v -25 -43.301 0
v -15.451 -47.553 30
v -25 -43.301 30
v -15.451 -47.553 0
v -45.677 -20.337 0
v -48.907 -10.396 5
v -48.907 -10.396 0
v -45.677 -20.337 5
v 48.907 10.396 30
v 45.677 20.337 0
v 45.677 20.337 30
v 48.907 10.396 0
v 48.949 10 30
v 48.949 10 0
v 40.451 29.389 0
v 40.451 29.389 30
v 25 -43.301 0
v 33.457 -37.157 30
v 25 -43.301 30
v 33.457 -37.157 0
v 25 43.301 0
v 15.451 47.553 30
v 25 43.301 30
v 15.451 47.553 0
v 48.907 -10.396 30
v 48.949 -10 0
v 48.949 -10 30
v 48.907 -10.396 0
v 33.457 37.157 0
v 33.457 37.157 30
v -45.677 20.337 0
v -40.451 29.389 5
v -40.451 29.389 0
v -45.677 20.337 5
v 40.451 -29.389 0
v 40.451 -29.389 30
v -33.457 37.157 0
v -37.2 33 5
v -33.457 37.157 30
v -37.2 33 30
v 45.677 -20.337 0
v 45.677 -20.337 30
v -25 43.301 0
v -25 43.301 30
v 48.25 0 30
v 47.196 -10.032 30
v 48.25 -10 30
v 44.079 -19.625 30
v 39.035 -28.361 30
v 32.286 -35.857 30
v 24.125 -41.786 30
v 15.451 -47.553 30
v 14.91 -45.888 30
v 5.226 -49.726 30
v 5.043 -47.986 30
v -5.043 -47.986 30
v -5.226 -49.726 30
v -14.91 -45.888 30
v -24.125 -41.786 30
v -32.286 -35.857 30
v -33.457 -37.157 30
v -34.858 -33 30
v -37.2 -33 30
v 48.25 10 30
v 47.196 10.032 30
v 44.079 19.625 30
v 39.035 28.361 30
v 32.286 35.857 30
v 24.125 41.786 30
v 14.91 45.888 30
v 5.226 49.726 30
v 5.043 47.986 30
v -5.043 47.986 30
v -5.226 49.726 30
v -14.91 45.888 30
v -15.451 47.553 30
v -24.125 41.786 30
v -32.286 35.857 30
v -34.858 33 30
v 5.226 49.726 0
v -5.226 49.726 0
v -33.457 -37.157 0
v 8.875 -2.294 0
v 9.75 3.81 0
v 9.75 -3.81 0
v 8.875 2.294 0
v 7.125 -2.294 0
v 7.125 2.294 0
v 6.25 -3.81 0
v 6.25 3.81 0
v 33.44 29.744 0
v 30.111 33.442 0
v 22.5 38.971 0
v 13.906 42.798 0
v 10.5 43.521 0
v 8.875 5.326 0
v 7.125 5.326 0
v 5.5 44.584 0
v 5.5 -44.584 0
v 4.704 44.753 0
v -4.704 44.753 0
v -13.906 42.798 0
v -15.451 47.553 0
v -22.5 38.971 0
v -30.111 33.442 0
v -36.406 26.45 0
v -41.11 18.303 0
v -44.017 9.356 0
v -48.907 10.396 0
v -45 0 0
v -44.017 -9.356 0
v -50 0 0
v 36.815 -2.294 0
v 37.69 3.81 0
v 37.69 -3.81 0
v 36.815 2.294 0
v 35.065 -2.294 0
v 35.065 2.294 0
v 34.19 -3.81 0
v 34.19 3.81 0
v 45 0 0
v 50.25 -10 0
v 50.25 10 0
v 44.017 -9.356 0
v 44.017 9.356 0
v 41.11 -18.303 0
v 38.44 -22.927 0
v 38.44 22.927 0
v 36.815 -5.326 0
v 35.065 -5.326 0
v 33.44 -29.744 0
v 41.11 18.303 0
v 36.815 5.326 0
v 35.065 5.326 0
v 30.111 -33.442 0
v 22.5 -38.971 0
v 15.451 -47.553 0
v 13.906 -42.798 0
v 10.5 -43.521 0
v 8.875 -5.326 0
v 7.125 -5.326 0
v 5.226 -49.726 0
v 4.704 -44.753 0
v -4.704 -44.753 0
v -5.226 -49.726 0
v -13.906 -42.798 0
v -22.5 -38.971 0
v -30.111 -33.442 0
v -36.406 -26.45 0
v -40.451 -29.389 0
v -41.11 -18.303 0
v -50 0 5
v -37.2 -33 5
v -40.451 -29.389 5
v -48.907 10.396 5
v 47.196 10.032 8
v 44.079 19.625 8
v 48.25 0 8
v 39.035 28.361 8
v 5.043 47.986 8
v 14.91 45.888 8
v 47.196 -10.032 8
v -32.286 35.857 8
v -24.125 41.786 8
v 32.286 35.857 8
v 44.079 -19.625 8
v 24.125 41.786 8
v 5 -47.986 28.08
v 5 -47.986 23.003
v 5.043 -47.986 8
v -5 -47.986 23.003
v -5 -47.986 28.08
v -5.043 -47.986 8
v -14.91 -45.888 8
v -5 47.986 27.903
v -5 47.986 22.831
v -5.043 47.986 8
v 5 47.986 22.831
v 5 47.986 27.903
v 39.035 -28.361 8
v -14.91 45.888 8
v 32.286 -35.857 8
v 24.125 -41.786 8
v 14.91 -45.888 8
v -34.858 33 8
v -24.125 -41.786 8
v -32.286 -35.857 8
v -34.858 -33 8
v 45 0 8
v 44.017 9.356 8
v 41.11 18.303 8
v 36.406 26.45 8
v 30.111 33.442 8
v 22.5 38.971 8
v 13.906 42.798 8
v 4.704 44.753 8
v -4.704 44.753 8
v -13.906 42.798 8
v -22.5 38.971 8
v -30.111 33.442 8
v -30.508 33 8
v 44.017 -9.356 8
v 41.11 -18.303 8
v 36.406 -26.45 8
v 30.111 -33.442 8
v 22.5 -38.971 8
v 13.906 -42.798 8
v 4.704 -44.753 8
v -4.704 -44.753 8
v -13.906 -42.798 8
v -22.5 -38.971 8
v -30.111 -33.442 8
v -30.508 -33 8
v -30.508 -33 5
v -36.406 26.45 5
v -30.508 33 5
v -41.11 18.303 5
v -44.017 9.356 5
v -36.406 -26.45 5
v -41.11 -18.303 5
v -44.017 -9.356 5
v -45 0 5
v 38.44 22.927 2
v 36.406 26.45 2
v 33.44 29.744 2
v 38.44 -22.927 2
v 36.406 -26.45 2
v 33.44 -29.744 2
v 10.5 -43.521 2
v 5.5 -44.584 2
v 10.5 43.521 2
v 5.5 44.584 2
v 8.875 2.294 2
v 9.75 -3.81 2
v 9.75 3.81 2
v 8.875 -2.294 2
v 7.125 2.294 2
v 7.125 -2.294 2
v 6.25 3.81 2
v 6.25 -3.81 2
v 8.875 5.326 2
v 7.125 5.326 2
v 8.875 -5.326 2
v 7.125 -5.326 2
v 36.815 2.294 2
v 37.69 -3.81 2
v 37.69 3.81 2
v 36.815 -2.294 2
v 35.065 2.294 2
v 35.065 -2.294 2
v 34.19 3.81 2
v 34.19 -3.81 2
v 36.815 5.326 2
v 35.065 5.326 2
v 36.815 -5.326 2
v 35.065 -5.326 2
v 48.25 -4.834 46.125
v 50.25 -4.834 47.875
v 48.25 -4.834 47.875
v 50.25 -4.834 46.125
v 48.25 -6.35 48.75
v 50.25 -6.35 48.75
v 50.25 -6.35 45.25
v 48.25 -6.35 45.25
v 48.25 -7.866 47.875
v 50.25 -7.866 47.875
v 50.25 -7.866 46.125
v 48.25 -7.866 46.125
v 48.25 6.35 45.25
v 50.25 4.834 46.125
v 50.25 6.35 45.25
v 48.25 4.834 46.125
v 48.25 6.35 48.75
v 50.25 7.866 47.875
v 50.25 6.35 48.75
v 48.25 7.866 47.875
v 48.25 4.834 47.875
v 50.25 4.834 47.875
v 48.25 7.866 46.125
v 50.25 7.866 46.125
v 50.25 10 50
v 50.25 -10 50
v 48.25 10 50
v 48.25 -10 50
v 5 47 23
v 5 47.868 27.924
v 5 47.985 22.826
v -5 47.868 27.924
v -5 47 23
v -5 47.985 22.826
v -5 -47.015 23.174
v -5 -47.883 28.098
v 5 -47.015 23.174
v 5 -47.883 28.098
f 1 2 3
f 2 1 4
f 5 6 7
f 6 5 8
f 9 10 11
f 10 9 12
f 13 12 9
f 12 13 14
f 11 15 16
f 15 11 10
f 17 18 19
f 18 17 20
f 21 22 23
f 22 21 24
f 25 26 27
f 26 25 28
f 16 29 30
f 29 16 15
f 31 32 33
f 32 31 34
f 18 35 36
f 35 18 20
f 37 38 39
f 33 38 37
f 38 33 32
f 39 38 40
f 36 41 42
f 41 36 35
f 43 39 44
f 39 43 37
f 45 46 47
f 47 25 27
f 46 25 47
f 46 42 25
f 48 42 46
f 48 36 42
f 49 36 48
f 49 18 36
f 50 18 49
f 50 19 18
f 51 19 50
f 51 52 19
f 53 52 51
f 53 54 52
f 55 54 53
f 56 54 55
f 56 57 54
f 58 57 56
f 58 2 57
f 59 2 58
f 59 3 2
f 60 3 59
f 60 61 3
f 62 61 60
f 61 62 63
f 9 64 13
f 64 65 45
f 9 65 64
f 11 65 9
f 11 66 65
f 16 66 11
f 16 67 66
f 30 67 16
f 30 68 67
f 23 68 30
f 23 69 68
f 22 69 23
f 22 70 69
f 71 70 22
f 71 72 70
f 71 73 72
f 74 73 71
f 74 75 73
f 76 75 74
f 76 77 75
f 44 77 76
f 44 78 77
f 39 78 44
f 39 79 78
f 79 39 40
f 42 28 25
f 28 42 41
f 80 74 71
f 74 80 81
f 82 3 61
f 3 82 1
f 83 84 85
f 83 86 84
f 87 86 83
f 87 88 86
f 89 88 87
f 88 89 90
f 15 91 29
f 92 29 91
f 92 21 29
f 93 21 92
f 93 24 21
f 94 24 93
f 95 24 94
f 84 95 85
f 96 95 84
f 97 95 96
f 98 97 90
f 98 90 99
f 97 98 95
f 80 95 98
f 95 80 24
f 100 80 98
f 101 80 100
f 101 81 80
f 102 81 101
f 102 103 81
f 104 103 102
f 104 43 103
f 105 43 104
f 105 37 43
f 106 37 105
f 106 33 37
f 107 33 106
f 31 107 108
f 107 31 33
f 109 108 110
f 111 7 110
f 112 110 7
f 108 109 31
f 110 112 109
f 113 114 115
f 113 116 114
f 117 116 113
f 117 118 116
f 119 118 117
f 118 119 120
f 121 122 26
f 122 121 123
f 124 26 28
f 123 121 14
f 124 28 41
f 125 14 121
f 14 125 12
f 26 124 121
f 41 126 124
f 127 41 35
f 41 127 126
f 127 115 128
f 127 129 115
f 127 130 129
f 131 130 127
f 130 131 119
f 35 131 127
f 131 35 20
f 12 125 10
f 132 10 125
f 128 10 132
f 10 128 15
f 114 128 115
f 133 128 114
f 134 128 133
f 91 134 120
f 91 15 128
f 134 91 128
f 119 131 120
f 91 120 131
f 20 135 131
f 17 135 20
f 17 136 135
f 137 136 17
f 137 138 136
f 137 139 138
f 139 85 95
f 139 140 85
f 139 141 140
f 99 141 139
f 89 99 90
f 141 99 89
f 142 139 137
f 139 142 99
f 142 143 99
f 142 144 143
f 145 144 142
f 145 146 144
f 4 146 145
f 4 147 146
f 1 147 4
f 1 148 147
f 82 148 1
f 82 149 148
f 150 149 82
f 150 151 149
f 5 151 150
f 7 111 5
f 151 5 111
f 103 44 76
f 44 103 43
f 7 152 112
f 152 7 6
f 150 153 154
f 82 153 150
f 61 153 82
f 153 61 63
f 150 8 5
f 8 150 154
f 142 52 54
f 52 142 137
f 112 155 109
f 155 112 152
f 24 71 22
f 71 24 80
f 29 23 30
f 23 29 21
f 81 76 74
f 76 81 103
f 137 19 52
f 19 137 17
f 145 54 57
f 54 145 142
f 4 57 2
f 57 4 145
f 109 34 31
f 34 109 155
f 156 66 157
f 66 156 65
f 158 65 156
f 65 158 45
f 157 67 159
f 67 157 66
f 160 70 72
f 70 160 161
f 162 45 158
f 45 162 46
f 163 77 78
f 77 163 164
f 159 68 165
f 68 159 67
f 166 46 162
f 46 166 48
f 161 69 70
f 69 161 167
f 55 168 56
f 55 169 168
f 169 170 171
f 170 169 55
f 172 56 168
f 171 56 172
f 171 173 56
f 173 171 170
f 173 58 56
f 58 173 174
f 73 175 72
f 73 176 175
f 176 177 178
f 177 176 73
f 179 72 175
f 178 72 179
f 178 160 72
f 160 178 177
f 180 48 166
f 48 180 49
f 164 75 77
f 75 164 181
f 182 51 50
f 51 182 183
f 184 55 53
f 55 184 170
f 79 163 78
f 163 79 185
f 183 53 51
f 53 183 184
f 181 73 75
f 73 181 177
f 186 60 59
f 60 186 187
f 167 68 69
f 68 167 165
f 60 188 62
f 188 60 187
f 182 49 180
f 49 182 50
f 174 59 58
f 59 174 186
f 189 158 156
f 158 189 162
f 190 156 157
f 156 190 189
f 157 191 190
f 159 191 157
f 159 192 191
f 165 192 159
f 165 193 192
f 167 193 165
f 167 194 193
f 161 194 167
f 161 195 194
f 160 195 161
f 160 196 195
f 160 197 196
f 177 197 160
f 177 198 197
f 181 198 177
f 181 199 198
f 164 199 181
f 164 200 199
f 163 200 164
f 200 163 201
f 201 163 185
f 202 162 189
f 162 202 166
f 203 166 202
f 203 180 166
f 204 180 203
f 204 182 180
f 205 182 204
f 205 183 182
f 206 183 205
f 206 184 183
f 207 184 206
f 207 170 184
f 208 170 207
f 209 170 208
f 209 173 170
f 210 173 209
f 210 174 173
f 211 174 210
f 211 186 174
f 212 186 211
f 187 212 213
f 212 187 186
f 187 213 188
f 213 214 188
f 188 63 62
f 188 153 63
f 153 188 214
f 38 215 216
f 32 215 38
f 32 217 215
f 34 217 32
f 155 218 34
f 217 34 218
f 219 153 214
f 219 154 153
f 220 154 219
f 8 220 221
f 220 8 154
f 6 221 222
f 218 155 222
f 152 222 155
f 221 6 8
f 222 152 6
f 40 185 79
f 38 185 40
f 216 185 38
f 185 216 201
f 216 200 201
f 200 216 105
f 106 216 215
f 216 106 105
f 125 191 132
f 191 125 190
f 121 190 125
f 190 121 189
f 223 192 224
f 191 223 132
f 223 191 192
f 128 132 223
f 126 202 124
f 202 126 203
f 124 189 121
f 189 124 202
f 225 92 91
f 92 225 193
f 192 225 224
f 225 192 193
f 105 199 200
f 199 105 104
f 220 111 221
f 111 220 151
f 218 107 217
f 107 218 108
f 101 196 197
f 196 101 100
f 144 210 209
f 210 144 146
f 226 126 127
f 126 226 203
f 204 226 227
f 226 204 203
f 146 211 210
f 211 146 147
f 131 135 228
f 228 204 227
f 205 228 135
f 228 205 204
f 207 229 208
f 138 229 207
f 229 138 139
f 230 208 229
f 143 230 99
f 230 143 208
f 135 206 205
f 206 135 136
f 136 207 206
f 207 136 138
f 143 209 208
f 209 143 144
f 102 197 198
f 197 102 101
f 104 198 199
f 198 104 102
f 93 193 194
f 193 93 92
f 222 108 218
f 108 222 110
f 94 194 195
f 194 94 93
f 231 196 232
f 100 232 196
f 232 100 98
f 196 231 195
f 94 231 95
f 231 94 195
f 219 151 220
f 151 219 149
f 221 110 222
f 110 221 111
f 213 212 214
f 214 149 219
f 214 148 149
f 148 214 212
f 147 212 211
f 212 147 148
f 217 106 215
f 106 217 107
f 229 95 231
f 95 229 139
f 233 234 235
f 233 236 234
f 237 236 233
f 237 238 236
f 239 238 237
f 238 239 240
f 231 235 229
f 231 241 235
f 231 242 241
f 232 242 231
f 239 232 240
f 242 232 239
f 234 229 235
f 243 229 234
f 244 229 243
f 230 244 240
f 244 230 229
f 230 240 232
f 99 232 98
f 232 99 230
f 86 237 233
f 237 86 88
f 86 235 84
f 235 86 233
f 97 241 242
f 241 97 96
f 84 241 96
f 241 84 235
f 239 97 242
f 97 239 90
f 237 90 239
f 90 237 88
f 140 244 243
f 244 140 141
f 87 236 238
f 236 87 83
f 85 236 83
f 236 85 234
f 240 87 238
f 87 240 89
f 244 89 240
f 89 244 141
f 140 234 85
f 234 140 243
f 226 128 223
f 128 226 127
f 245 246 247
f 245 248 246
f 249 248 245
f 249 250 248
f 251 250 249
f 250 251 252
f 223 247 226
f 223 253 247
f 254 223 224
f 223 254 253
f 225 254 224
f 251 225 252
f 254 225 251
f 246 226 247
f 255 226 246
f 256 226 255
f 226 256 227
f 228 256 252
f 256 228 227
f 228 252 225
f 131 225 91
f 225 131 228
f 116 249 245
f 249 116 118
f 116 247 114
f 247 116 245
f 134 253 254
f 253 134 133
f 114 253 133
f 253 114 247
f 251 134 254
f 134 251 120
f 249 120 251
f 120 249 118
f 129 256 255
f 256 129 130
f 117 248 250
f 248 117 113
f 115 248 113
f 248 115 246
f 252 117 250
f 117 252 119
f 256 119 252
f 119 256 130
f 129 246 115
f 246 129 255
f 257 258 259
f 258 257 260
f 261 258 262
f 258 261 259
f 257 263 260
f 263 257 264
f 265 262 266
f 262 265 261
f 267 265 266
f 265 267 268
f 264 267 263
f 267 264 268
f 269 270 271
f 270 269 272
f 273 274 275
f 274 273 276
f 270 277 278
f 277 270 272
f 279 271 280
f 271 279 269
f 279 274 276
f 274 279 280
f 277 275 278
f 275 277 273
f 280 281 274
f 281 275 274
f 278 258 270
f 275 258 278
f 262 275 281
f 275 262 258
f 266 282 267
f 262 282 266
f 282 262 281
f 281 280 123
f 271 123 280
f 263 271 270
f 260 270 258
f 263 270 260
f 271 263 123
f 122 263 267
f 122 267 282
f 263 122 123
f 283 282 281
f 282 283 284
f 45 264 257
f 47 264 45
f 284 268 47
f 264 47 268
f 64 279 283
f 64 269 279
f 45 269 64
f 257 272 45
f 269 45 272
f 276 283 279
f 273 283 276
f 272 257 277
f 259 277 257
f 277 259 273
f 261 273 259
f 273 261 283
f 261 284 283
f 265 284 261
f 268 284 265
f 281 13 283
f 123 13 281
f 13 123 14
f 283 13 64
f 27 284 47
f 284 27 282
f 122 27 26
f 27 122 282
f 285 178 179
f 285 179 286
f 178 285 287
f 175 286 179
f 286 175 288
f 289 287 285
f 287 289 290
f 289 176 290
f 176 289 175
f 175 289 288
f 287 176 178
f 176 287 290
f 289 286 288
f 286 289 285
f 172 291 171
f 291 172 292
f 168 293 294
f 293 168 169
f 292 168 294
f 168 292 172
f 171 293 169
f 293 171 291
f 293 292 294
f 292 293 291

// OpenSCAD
// if 0 - all parts, if 1 base if 2 ardunio mount
parts = 1;

if (parts != 2){
union(){
  difference(){
    // Main Body
    cylinder(r=50,h=30);
    // Big Hole
    translate([0,0,8]){
      cylinder(r=48.25, h=30);
    }
    translate([0,0,5]){
      intersection(){
        //Cutout the 'notch'
        rotate([0,0,90]){
          translate([-33,0,0]){
            cube([66,100,30]);
          }
        }
      }
    }
    //keep top circumfrance thin
    cylinder(r=45,h=30);
  }
  translate([-47.5,-2.5,0]){
    difference(){
      union(){
        //cube([95,5,2]);  // middle bar
        translate([47.5+8,2.5,1]){
          //cube([20,20,2], center = true);
          //long mount
          difference(){
            cube([5,90,2], center = true);
            //holes in mount
            translate([0,7.62/2,-1]){
              cylinder(r=1.75,h=2);
            }
            translate([0,-7.62/2,-1]){
              cylinder(r=1.75,h=2);
            }
         }
         //short mount
         translate([27.94,0,0]){
           difference(){
             cube([5,60,2],center= true);
             //holes in mount
             translate([0,7.62/2,-1]){
               cylinder(r=1.75,h=2);
             }
             translate([0,-7.62/2,-1]){
               cylinder(r=1.75,h=2);
             }
           }
         }
       }
     }
     translate([47.5-13,2.5,0]){
       translate([4,0,0]){
         //cylinder(r=2.5,h=2);
         translate([0,5.5,0]){
           cylinder(r=1.75,h=2);
         }
       }
       translate([-4,0,0]){
         //cylinder(r=2.5,h=2);
         translate([0,5.5,0]){
           cylinder(r=1.75,h=2);
         }
       }
     }
   }
  }
  translate([-5,47,15 + 8]){
    rotate([-10,0,0]){
      cube([10,1,5]);
    }
  }
  translate([-5,-48,15 + 8]){
    rotate([10,0,0]){
      cube([10,1,5]);
    }
  }
  // mag holder
  translate([48.25,-10,0]){
    difference(){
      cube([2,20,50]);
      translate([-1,10,47]){
        translate([0,-6.35,0]){
          rotate([0,90,0]){
		      cylinder(r=1.75,h=4);
          }
        }
        translate([0,6.35,0]){
          rotate([0,90,0]){
		      cylinder(r=1.75,h=4);
          }
        }
      }
    }
  }
}
}
if (parts != 1){
  difference(){
  union(){
  translate([-47.5,-2.5,-1]){
    difference(){
      union(){
        translate([47.5-13,2.5,1]){
          difference(){
            union(){
				  translate([-2,-27,0]){
                cube([4,54,38]);
              }
				  translate([0,24.2,0]){
                cylinder(r=4,h=50);
              }
              translate([0,-24.2,0]){
                cylinder(r=4,h=50);
              }
            }
            translate([0,24.2,0]){
              cylinder(r=1.75,h=80);
            }
            translate([0,-24.2,0]){
              cylinder(r=1.75,h=80);
            }
         }
         translate([50,0,0]){
           difference(){
             union(){
               translate([-2,-27,0]){
                 cube([4,54,38]);
               }
               translate([0,8.65,0]){
                 cylinder(r=4,h=50);
               }
               translate([0,-18.65,0]){
                 cylinder(r=4,h=50);
               }
             }
             translate([0,8.65,0]){
               cylinder(r=1.75,h=80);
             }
             translate([0,-18.65,0]){
               cylinder(r=1.75,h=80);
             }
           }
         }
         translate([2,23,0]){
           cube([50,4,38]);
         }
         translate([2,-27,0]){
           cube([50,4,38]);
         }
       }
     }
   }
 }
difference(){
translate([10,0,0]){
  rotate([90,0,0]){
    translate([0,2,-27]){
      translate([23/2,0,0]){
        cylinder(r=4, h=5);
      }
      translate([-23/2,0,0]){
        cylinder(r=4, h=5);
      }
      translate([23/2,30,0]){
        cylinder(r=4, h=5);
      }
      translate([-23/2,30,0]){
        cylinder(r=4, h=5);
      }
    }
    translate([0,2,22]){
      translate([23/2,0,0]){
        cylinder(r=4, h=5);
      }
      translate([-23/2,0,0]){
        cylinder(r=4, h=5);
      }
      translate([23/2,30,0]){
        cylinder(r=4, h=5);
      }
      translate([-23/2,30,0]){
        cylinder(r=4, h=5);
      }
    }
  }
}
translate([-50,-50,-2]){
cube([100,100,2]);
}
}
}
translate([10,0,0]){
rotate([90,0,0]){
translate([0,2,-50]){
translate([23/2,0,0]){
cylinder(r=1.75, h=100);
}
translate([-23/2,0,0]){
cylinder(r=1.75, h=100);
}
translate([23/2,30,0]){
cylinder(r=1.75, h=100);
}
translate([-23/2,30,0]){
cylinder(r=1.75, h=100);
}
}
}
}
}
}
